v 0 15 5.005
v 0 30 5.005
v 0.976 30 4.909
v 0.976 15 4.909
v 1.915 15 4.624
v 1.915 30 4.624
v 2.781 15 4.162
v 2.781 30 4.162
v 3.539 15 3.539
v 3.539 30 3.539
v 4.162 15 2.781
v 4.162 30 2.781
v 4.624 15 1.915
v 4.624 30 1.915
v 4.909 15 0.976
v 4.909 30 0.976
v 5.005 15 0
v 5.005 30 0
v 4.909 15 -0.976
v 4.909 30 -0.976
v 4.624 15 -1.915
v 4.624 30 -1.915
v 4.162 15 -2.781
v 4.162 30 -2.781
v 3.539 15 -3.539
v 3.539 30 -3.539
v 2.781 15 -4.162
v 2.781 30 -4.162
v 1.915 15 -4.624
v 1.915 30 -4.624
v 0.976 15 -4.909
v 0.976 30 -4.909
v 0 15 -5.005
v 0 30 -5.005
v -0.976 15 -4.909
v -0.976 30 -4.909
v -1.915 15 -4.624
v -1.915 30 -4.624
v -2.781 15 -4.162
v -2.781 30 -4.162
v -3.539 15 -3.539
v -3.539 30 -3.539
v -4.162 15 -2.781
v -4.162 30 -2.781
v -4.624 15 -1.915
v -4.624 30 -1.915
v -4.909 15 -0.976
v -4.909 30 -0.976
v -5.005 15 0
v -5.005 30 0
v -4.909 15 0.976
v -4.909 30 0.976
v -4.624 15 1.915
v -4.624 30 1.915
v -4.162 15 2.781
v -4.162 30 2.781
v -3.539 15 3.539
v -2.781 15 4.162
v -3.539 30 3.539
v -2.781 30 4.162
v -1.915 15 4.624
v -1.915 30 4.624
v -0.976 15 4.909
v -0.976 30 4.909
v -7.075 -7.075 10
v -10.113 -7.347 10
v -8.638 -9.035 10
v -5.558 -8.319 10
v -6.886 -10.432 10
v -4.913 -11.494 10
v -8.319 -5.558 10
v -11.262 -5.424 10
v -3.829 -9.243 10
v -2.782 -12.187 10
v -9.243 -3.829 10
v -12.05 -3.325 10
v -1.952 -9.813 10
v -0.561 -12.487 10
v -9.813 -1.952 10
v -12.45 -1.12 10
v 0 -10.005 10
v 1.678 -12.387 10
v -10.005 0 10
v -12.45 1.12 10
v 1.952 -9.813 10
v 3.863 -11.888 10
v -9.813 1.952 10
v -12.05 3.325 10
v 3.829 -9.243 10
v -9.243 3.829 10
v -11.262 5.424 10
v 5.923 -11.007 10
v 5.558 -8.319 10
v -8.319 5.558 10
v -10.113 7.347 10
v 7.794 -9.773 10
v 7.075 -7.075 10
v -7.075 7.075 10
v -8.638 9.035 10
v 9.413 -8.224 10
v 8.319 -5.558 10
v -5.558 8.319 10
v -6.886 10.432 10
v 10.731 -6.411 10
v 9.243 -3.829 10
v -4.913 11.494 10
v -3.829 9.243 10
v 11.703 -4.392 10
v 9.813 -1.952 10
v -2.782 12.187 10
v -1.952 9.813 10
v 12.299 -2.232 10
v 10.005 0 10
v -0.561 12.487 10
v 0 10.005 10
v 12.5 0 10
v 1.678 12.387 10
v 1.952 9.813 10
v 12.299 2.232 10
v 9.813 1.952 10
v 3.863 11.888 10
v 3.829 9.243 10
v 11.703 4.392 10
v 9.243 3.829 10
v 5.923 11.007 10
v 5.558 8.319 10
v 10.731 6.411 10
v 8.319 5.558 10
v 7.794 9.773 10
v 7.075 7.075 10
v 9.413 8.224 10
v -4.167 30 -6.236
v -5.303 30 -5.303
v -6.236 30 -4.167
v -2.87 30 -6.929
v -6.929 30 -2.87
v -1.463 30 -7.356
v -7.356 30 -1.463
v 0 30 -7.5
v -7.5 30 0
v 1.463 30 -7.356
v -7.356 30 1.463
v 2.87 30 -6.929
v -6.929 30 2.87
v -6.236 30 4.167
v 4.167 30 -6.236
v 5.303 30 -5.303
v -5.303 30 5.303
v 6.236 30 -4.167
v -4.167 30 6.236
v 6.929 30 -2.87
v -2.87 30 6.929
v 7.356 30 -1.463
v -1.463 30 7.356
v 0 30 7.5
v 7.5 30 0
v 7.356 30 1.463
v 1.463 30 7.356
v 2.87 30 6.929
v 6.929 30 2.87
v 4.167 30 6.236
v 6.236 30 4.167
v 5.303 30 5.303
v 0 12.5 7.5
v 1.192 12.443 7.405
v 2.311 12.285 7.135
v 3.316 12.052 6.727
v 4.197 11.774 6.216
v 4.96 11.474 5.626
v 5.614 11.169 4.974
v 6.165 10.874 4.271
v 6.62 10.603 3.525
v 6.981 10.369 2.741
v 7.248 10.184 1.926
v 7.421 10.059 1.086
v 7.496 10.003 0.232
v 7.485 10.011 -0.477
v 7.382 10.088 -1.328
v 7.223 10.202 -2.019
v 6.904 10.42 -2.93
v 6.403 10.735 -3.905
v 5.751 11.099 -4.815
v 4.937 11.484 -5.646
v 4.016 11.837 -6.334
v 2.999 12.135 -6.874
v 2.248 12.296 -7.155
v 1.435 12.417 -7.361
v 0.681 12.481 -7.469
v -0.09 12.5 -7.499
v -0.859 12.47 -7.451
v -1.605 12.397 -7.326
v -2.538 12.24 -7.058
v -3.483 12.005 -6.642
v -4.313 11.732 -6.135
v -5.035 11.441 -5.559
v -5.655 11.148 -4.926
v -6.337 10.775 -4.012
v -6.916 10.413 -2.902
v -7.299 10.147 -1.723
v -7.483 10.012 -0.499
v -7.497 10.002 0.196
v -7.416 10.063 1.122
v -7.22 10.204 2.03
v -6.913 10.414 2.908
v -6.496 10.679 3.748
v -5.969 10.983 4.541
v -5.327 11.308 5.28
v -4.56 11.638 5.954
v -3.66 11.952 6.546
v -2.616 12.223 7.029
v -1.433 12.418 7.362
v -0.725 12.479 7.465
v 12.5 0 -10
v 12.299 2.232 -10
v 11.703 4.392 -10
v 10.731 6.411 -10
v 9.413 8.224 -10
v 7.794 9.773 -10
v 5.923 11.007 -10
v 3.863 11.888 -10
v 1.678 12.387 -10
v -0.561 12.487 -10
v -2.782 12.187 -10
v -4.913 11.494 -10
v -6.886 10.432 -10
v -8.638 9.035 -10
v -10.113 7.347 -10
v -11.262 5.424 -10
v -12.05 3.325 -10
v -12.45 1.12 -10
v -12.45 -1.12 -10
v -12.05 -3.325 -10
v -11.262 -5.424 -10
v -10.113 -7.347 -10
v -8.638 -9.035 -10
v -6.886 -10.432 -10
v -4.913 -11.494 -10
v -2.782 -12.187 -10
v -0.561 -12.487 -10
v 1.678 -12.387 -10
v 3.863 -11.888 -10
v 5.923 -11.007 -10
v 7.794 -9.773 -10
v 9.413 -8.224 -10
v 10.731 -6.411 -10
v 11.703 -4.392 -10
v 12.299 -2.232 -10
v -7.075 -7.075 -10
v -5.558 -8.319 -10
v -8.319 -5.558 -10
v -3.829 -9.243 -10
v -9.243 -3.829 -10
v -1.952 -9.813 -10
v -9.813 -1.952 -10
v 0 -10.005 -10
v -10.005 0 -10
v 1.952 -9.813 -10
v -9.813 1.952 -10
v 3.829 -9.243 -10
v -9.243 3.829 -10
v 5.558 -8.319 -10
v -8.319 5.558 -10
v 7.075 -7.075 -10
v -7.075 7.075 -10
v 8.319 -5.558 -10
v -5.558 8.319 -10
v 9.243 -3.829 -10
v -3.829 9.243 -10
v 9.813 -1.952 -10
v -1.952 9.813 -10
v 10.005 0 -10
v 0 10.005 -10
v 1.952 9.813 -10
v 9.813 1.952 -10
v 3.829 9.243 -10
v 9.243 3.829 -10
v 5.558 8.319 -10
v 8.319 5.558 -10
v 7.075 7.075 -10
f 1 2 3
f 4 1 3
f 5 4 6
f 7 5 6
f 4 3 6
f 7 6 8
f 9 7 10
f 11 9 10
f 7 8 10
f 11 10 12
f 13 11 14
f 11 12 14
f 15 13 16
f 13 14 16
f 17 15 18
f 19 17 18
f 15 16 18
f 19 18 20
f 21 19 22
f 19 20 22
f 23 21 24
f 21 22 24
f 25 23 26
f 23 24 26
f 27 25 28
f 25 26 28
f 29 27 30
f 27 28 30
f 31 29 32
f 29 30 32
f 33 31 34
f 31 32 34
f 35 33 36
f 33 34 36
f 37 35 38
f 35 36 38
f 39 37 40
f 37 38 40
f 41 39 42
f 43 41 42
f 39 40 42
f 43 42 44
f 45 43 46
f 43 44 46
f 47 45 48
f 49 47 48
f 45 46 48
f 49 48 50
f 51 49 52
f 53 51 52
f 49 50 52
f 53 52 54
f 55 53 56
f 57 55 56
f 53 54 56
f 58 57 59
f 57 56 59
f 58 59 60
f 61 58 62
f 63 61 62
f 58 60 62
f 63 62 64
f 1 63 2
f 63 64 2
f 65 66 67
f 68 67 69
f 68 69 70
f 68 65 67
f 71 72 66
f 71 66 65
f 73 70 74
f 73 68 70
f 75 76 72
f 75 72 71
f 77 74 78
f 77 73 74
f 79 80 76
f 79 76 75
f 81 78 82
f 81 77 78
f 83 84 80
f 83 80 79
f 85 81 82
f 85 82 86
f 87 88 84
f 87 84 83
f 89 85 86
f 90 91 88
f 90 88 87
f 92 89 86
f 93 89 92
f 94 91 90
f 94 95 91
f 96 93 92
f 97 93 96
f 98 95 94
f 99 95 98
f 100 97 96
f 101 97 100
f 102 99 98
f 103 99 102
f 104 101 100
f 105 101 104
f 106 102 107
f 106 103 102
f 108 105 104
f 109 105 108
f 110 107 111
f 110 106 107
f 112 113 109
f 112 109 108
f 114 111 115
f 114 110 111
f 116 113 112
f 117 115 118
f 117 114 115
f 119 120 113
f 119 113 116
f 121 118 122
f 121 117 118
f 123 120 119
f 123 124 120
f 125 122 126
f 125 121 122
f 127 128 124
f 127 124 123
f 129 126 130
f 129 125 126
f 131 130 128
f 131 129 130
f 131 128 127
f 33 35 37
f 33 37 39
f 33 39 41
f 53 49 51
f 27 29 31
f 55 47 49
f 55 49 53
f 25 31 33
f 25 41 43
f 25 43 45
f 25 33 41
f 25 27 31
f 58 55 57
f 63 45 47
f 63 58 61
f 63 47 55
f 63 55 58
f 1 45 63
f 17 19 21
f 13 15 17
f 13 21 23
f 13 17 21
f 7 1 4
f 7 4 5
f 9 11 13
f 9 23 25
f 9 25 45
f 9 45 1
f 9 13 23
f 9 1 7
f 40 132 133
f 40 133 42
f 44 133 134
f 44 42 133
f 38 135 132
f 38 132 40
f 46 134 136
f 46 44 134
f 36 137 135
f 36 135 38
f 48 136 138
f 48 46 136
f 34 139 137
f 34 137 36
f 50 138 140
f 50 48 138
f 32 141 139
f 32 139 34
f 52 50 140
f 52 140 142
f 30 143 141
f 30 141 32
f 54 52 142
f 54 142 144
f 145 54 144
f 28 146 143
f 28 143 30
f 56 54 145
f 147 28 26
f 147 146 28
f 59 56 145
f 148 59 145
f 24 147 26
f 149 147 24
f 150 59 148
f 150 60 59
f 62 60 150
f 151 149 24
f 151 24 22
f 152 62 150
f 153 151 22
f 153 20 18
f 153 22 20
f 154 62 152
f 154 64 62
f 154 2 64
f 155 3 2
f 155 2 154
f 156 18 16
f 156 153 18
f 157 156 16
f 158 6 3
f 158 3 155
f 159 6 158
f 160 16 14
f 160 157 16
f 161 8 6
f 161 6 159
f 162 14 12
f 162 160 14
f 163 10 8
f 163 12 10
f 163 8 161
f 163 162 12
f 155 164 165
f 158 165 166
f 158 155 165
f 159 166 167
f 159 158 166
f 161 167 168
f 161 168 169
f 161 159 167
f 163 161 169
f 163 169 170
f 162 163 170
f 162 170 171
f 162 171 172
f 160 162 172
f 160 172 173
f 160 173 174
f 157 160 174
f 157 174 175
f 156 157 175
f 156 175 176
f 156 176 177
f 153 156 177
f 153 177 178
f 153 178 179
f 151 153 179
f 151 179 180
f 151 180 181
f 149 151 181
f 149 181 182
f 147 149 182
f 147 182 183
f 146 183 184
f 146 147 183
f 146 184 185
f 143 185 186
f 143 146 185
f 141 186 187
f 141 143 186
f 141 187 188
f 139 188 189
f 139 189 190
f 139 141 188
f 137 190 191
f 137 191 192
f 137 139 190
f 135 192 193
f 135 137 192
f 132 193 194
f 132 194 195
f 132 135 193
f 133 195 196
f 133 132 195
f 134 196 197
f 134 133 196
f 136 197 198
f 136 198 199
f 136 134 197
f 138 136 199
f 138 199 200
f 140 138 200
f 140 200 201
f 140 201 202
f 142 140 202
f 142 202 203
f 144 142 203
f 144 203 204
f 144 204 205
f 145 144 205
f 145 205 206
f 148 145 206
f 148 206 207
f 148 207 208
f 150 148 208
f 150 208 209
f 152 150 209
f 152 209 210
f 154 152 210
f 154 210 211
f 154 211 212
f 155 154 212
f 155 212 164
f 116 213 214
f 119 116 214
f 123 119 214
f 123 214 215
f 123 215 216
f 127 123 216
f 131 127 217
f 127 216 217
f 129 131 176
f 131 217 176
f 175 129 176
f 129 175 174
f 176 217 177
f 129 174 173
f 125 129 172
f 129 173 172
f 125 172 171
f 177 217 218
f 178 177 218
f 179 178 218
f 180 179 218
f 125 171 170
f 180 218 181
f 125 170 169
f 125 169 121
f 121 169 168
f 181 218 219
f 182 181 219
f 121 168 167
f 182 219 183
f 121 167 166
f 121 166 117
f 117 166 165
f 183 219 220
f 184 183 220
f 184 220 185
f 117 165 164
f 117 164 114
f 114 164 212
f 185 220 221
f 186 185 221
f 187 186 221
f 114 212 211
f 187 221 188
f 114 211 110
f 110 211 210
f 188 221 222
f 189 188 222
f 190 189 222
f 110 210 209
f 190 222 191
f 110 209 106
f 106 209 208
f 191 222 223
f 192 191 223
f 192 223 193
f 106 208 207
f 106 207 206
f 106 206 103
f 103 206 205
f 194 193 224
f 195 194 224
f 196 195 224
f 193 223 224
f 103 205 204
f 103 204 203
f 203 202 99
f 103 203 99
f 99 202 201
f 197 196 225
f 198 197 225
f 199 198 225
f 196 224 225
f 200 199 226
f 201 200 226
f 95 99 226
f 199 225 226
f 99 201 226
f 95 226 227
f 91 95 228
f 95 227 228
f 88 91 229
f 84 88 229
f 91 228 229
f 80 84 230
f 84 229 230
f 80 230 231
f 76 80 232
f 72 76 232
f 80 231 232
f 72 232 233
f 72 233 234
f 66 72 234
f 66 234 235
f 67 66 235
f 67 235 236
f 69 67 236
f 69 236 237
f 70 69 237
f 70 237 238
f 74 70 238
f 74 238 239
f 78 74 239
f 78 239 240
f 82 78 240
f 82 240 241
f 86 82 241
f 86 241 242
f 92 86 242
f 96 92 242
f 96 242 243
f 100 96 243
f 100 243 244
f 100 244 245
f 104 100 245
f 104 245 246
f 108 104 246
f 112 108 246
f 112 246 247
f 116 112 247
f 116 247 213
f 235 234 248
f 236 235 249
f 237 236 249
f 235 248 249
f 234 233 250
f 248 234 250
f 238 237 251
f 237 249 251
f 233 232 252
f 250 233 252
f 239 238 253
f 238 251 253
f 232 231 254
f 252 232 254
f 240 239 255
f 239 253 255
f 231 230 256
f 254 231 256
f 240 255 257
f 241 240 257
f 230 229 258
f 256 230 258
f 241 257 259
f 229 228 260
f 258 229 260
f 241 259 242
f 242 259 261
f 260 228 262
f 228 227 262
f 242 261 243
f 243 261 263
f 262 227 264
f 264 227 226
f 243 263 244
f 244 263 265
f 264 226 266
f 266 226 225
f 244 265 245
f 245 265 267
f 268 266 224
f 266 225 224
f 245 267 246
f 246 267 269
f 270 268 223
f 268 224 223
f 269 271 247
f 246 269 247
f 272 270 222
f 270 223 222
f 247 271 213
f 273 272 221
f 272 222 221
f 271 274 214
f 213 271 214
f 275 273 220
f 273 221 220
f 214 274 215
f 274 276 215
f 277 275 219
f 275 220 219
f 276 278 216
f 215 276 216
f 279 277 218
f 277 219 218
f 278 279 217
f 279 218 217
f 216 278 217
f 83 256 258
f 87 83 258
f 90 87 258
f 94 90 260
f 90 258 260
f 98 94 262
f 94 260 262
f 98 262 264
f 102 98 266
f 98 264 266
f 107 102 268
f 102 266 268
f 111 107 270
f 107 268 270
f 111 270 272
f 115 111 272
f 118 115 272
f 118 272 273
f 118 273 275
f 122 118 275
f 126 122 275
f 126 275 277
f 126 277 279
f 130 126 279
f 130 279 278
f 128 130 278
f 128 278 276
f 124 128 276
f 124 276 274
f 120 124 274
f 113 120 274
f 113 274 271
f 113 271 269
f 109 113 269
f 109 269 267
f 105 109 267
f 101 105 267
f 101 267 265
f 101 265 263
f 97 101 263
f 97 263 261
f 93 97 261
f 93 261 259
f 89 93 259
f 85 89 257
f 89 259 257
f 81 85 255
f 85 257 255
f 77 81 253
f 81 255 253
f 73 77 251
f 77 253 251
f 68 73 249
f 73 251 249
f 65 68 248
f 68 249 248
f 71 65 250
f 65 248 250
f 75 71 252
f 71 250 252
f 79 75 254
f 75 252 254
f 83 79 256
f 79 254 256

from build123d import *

# Parameters (mm, degrees)
SKETCH3_R                = 7.5
BOSS_EXTRUDE1_DEPTH      = 22
BOSS_EXTRUDE2_DEPTH      = 10
BOSS_EXTRUDE2_DEPTH_BACK = 10
SKETCH1_R                = 12.5
SKETCH6_R                = 10.005
CUT_EXTRUDE1_DEPTH       = 49
SKETCH5_R                = 5.005
CUT_EXTRUDE2_DEPTH       = 15


with BuildPart() as part:
    # Sketch3 → Boss-Extrude1 (new body)
    with BuildSketch(Plane(origin=(0, 30, 0), x_dir=(1, 0, 0), z_dir=(0, 1, 0))):
        with Locations(Location((0, 0, 0), (0, 0, 270))):
            Circle(SKETCH3_R)
    extrude(amount=-BOSS_EXTRUDE1_DEPTH)

    # Sketch1 → Boss-Extrude2 (add, two sides: drawn at the far end of the back side and taken through both)
    with BuildSketch(Plane.XY.offset(-BOSS_EXTRUDE2_DEPTH_BACK)):
        Circle(SKETCH1_R)
    extrude(amount=BOSS_EXTRUDE2_DEPTH + BOSS_EXTRUDE2_DEPTH_BACK)

    # Sketch6 → Cut-Extrude1 (cut)
    with BuildSketch(Plane(origin=(0, 0, -10), x_dir=(-1, 0, 0), z_dir=(0, 0, -1))):
        Circle(SKETCH6_R)
    extrude(amount=-CUT_EXTRUDE1_DEPTH, mode=Mode.SUBTRACT)

    # Sketch5 → Cut-Extrude2 (cut)
    with BuildSketch(Plane(origin=(0, 30, 0), x_dir=(1, 0, 0), z_dir=(0, 1, 0))):
        with Locations(Location((0, 0, 0), (0, 0, 270))):
            Circle(SKETCH5_R)
    extrude(amount=-CUT_EXTRUDE2_DEPTH, mode=Mode.SUBTRACT)


solid = part.part
